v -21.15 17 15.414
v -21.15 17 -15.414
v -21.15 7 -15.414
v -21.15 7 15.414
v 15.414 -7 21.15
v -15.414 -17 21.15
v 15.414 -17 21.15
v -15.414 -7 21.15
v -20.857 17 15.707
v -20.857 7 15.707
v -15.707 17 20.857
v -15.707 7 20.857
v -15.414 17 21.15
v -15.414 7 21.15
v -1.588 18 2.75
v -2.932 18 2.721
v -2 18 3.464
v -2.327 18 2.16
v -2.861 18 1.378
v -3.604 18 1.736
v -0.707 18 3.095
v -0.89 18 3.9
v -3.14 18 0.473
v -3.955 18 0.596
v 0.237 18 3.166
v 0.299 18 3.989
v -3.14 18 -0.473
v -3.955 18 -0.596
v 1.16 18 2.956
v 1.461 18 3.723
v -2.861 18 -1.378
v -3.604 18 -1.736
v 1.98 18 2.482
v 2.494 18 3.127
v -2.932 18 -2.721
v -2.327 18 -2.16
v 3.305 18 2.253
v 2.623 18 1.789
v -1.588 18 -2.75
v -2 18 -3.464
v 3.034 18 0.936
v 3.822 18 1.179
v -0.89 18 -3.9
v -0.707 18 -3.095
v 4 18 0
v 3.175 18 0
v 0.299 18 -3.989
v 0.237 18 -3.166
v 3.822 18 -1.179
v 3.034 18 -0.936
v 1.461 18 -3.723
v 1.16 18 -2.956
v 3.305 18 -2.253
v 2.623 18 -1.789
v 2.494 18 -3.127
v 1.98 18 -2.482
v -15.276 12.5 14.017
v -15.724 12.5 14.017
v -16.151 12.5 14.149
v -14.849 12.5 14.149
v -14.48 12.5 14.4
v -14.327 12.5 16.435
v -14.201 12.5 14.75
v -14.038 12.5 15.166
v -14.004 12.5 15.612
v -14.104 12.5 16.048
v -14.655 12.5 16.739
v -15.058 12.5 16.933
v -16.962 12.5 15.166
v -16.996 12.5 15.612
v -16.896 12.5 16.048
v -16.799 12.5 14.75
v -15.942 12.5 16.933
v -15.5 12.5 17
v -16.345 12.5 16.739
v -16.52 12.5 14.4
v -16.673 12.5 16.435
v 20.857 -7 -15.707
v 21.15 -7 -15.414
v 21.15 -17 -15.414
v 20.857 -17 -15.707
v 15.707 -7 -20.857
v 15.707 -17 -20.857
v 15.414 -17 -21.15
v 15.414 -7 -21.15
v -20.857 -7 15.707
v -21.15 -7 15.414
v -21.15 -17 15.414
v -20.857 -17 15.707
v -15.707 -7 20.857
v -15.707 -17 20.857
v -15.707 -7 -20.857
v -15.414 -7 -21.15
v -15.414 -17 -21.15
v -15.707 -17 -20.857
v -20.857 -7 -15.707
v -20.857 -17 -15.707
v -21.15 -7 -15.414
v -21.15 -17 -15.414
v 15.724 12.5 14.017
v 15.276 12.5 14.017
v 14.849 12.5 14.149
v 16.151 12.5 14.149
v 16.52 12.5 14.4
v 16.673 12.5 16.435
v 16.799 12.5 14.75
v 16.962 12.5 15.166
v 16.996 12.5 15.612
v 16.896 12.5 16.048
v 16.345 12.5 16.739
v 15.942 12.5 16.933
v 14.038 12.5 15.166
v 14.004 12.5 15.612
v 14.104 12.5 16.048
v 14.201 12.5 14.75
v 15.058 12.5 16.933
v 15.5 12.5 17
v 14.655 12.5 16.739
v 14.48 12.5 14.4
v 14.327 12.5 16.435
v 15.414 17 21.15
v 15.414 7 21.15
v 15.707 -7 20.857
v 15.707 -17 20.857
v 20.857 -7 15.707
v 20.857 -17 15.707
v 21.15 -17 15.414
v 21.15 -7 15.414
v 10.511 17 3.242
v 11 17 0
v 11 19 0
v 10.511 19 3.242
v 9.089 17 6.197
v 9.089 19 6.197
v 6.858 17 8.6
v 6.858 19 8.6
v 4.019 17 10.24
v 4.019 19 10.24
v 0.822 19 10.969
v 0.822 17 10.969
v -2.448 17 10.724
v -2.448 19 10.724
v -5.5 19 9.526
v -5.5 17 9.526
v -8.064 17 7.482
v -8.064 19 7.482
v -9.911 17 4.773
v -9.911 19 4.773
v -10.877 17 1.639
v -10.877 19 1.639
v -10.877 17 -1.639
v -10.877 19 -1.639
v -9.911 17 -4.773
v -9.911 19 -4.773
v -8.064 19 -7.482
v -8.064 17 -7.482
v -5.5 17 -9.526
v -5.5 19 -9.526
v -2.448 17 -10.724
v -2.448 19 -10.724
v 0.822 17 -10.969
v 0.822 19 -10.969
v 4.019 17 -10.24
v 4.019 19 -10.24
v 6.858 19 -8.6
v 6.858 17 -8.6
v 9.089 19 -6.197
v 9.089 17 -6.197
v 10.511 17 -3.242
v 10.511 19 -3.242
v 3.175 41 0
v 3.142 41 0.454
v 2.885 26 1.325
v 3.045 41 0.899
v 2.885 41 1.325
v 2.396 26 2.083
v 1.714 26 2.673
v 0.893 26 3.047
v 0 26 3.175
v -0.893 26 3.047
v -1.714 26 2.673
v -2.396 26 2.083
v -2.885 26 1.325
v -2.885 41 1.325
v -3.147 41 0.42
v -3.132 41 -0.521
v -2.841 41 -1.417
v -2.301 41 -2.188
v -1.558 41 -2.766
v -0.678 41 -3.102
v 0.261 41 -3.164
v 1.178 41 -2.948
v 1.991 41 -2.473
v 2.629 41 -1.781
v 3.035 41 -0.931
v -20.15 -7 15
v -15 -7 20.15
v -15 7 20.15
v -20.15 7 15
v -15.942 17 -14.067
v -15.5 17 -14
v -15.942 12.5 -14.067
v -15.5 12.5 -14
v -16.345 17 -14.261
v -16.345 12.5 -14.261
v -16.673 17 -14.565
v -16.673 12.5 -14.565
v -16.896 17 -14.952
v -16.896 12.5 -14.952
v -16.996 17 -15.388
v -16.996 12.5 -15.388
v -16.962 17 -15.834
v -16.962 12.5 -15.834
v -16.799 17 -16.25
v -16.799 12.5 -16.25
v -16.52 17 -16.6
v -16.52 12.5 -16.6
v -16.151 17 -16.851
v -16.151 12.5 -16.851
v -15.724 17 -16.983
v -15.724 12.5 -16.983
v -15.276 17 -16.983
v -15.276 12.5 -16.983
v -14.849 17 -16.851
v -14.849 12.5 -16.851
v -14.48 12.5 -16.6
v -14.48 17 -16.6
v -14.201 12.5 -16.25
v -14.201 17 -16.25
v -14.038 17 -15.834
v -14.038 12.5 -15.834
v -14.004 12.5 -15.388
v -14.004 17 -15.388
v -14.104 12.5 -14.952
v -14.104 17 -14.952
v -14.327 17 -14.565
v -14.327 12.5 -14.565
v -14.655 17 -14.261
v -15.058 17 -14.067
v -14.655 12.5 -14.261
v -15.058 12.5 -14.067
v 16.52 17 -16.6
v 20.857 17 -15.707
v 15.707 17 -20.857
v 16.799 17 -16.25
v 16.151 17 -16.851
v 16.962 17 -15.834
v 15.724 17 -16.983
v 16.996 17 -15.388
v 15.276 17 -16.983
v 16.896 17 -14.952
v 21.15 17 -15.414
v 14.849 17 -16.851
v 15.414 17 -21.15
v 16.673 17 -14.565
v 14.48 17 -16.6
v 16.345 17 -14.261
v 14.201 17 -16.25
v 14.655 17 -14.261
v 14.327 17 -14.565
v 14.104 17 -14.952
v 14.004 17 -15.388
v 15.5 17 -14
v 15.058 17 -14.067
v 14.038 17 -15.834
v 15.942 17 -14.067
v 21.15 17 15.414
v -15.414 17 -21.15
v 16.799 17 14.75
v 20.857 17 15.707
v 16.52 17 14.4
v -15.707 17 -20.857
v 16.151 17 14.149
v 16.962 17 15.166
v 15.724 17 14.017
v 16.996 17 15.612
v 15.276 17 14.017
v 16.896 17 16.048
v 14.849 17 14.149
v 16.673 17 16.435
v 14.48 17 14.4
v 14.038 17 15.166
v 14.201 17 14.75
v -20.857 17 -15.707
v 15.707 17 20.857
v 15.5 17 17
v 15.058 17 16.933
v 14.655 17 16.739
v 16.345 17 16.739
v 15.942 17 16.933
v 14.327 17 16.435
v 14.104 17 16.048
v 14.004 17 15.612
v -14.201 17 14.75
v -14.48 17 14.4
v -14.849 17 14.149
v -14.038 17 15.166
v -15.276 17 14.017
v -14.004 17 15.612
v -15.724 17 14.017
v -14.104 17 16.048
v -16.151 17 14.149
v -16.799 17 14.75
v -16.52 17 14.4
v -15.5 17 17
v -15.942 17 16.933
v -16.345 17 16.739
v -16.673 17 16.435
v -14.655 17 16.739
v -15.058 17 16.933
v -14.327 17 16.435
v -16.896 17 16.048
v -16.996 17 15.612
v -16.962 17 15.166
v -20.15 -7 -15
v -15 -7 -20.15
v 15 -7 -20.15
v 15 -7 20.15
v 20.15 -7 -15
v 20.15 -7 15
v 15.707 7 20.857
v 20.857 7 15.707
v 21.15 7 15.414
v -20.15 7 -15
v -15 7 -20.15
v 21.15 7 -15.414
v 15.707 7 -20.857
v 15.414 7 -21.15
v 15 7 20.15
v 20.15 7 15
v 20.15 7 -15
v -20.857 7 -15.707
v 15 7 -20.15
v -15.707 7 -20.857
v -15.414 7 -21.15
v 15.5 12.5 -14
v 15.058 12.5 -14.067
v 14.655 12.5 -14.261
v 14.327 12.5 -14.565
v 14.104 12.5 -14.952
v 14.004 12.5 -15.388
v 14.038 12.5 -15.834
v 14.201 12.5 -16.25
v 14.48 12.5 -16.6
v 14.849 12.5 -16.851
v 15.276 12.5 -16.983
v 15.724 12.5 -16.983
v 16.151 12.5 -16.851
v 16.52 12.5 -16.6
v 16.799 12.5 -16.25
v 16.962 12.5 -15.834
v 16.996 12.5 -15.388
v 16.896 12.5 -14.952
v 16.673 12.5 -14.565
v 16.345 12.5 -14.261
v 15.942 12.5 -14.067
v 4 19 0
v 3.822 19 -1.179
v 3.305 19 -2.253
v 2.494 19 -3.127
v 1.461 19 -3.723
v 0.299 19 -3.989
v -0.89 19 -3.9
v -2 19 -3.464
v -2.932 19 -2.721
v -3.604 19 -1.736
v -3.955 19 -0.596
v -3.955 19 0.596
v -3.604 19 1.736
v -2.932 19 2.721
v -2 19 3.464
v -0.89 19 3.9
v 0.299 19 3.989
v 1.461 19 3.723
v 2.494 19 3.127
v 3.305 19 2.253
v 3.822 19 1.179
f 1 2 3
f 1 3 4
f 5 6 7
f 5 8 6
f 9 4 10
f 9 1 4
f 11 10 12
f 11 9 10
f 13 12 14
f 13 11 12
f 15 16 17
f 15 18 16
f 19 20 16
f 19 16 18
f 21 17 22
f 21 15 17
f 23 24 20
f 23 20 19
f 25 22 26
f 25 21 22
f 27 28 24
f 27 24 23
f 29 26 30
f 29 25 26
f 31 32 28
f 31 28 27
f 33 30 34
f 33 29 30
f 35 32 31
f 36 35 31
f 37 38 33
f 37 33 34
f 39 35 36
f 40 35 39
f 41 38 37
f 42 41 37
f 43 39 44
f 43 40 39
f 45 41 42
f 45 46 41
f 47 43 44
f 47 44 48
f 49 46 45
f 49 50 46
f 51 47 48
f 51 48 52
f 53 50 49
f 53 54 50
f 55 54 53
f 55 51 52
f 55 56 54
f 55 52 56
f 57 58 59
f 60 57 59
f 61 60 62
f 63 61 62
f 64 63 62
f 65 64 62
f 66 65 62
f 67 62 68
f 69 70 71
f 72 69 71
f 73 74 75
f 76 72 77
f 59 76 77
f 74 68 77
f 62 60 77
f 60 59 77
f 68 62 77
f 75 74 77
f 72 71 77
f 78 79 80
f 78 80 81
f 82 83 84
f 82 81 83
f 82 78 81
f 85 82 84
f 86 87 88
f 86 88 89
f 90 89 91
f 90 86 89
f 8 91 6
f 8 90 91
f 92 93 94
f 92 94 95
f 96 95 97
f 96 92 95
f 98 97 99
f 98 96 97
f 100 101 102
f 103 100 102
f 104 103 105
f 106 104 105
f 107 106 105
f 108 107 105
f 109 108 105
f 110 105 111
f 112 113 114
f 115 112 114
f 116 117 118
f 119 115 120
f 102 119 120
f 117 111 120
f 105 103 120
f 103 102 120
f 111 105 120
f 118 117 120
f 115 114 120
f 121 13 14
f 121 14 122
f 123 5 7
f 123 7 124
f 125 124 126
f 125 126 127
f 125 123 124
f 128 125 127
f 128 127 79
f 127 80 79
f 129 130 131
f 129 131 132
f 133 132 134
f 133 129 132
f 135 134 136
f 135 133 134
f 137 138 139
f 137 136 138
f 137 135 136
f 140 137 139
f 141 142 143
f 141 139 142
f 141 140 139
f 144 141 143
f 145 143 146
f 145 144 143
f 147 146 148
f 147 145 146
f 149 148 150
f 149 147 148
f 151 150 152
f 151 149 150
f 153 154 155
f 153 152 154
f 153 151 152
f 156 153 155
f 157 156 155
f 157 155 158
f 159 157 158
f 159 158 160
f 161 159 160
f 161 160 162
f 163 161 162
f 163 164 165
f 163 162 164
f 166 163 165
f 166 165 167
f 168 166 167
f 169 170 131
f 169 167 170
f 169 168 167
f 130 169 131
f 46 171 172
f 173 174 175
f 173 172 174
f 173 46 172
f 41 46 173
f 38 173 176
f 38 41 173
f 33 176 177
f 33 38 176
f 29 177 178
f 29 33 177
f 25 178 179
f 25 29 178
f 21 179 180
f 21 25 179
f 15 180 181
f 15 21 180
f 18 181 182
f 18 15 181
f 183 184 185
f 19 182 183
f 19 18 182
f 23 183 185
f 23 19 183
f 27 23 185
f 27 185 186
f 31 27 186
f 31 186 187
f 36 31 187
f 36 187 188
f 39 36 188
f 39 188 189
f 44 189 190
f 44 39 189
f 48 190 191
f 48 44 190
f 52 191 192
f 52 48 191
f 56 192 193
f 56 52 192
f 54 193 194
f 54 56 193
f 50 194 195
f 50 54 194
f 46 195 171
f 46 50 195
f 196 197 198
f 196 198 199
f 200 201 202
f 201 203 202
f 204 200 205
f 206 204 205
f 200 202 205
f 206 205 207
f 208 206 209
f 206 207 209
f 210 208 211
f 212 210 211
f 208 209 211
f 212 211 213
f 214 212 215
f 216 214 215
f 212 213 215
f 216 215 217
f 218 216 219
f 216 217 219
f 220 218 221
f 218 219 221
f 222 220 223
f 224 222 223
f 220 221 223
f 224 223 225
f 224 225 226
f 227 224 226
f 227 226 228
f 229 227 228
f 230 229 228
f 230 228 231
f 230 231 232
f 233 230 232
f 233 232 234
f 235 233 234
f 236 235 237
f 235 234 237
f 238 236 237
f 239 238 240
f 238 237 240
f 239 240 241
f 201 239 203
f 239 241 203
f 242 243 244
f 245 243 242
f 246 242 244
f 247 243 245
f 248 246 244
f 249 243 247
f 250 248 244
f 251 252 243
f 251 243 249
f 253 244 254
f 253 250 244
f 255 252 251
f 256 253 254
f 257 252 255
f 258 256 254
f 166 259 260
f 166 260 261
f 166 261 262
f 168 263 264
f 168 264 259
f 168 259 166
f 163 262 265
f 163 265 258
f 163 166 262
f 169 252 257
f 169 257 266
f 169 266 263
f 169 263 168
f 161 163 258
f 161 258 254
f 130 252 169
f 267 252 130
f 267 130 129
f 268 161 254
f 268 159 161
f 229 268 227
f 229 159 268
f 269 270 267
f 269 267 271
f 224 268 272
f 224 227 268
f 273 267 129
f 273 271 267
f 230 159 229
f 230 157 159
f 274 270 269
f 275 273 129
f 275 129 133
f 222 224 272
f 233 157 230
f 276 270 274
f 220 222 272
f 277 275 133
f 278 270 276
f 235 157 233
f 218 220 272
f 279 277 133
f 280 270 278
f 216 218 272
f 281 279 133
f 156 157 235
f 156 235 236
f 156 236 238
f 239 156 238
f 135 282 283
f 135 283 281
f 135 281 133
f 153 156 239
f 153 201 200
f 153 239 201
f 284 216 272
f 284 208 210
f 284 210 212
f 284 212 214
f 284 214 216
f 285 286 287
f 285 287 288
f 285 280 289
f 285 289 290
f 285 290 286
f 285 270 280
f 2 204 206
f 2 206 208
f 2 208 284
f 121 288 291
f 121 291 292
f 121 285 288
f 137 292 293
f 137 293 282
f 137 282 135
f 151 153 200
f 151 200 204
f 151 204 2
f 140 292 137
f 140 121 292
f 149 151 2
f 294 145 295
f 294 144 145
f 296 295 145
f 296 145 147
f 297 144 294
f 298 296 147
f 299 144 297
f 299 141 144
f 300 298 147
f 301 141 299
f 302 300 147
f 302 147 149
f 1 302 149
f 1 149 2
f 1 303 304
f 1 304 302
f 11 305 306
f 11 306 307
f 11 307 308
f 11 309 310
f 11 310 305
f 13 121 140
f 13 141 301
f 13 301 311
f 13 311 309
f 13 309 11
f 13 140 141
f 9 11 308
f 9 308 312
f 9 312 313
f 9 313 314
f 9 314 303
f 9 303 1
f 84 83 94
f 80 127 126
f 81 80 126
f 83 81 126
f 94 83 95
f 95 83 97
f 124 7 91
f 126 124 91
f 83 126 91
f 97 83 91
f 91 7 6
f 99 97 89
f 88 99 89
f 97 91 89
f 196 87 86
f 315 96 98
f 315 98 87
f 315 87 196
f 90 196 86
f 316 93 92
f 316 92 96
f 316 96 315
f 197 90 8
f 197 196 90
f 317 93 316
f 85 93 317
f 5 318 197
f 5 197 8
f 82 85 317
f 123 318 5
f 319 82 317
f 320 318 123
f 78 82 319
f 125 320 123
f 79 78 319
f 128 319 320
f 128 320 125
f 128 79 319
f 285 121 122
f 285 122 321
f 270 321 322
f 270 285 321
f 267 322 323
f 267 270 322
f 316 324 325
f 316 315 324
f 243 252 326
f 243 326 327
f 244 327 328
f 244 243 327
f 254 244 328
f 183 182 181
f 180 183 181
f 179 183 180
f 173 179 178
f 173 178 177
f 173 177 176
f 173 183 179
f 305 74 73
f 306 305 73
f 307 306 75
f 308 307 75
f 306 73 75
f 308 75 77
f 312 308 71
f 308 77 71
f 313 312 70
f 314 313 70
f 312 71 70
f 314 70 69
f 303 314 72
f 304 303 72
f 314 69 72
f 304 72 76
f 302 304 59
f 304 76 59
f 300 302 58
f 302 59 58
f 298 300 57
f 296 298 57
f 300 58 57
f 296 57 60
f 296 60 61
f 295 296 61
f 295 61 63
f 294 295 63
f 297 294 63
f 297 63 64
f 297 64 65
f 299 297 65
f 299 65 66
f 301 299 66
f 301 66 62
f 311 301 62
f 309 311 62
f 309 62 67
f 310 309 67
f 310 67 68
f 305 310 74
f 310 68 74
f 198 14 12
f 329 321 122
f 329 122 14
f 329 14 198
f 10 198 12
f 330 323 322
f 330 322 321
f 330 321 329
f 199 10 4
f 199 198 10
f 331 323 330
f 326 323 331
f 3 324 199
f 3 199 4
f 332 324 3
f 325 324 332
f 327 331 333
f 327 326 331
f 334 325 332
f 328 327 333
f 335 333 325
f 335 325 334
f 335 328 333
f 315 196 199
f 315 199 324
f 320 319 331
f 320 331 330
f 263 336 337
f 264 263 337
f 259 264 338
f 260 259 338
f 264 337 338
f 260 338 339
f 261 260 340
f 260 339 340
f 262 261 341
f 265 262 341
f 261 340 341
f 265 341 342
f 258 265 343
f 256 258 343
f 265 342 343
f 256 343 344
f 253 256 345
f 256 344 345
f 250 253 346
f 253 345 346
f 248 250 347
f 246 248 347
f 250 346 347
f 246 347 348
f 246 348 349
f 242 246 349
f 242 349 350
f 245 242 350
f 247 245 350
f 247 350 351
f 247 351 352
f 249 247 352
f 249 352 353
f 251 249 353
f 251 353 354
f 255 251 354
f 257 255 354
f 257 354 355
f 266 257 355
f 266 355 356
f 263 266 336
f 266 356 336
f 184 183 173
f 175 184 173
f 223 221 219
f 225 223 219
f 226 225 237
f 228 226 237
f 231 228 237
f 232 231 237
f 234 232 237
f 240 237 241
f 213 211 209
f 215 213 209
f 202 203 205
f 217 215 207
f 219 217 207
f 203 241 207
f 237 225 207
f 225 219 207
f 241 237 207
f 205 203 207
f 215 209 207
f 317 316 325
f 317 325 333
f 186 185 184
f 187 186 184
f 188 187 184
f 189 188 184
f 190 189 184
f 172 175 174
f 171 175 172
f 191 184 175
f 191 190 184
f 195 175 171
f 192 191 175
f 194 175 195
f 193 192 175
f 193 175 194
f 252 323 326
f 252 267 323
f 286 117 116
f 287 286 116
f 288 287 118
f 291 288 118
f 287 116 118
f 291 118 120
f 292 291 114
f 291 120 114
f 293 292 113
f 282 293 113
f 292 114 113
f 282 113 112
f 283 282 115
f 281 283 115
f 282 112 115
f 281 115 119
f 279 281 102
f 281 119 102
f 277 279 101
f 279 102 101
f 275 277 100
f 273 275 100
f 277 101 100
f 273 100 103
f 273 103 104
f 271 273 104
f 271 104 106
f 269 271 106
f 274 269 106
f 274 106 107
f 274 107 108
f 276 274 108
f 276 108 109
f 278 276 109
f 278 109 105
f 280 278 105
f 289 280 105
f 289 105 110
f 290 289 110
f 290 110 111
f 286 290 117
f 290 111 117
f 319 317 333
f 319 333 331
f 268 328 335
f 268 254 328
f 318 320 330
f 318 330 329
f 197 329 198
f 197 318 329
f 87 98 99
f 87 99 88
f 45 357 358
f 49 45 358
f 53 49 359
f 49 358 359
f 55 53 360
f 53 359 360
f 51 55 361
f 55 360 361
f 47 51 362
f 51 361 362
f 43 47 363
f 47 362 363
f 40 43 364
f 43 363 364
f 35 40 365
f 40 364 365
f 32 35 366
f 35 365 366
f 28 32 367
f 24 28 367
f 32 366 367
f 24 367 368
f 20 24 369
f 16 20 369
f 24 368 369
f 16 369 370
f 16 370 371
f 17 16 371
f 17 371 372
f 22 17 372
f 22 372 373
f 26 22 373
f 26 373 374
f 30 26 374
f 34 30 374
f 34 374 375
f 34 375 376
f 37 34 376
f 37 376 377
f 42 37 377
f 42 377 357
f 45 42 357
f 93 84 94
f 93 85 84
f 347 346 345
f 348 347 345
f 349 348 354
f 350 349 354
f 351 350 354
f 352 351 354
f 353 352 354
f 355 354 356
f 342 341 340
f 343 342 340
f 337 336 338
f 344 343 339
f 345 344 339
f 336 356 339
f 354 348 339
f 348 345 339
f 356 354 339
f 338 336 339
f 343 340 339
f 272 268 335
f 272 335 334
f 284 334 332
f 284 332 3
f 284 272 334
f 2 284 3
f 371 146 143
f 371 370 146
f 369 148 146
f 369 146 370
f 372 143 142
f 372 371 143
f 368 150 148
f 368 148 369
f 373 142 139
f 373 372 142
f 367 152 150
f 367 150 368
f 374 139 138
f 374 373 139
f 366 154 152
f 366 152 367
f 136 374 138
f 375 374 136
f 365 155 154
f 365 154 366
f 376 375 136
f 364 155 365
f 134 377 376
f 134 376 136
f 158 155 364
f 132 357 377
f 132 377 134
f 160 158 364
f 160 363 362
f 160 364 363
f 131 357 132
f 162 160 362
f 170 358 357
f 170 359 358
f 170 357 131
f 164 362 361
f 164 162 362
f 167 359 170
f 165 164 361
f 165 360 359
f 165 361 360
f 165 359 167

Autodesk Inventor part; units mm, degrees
ref_plane "YZ Plane" through (0, 0, 0) normal (1, 0, 0) x (0, 1, 0)
ref_plane "XZ Plane" through (0, 0, 0) normal (0, 1, 0) x (-1, 0, 0)
ref_plane "XY Plane" through (0, 0, 0) normal (0, 0, 1) x (1, 0, 0)
sketch "Sketch2" plane through (0, 0, 0) normal (0, 1, 0) x (-1, 0, 0)
  line L0 (15, 20.15) -> (20.15, 15)
  line L1 (20.15, 15) -> (20.15, -15)
  line L2 (20.15, -15) -> (15, -20.15)
  line L3 (15, -20.15) -> (-15, -20.15)
  line L4 (-15, -20.15) -> (-20.15, -15)
  line L5 (-20.15, -15) -> (-20.15, 15)
  line L6 (-20.15, 15) -> (-15, 20.15)
  line L7 (-15, 20.15) -> (15, 20.15)
  point P0 (0, 0)
  point P1 (20.15, 0)
  point P2 (0, -20.15)
  dimension "d2" = 30
  dimension "d3" = 40.3
  dimension "d4" = 135
extrude "Extrusion1" add sketch "Sketch2" along normal mid plane 34
sketch "Sketch7" plane through (0, 17, 0) normal (0, 1, 0) x (1, 0, 0)
  circle A0 centre (0, 0) radius 11
  dimension "d27" = 22
extrude "Extrusion3" add sketch "Sketch7" along normal blind 2
sketch "Sketch8" plane through (0, 19, 0) normal (0, 1, 0) x (1, 0, 0)
  circle A0 centre (0, 0) radius 4
  dimension "d30" = 8
extrude "Extrusion4" cut sketch "Sketch8" against normal blind 1
sketch "Sketch9" plane through (0, 18, 0) normal (0, 1, 0) x (1, 0, 0)
  circle A0 centre (0, 0) radius 3.175
  dimension "d33" = 6.35
extrude "Extrusion5" add sketch "Sketch9" along normal blind 23
sketch "Sketch10" plane through (-15, 17, 20.15) normal (0, 0, 1) x (1, 0, 0)
  line L0 (30, 0) -> (30, -34) projected
  line L1 (0, 0) -> (30, 0) projected
  line L2 (0, -34) -> (0, 0) projected
  line L3 (30, -34) -> (0, -34) projected
  line L4 (0, 0) -> (30, 0)
  line L5 (30, 0) -> (30, -10)
  line L6 (30, -10) -> (0, -10)
  line L7 (0, -10) -> (0, 0)
  line L8 (0, 0) -> (30, -10) construction
  line L9 (30, 0) -> (0, -10) construction
  line L10 (0, -24) -> (30, -24)
  line L11 (30, -24) -> (30, -34)
  line L12 (30, -34) -> (0, -34)
  line L13 (0, -34) -> (0, -24)
  line L14 (0, -24) -> (30, -34) construction
  line L15 (30, -24) -> (0, -34) construction
  line L16 (0, 0) -> (30, 0) projected
  point P0 (15, -17)
  point P1 (15, -5)
  point P2 (15, -29)
  dimension "d36" = 10
  dimension "d37" = 10
extrude "Extrusion6" add sketch "Sketch10" along normal blind 1 contours L0 L6 L2 L1 | L0 L3 L2 L10
mirror "Mirror1" about plane through (0, 0, 0) normal (0, 0, 1) of "Extrusion6"
sketch "Sketch11" plane through (20.15, -17, -15) normal (1, 0, 0) x (0, 0, -1)
  line L0 (0, 34) -> (0, 0) projected
  line L1 (-30, 34) -> (0, 34) projected
  line L2 (-30, 34) -> (-30, 0) projected
  line L3 (0, 0) -> (-30, 0) projected
  line L4 (-30, 34) -> (0, 34)
  line L5 (0, 34) -> (0, 24)
  line L6 (0, 24) -> (-30, 24)
  line L7 (-30, 24) -> (-30, 34)
  line L8 (-30, 34) -> (0, 24) construction
  line L9 (0, 34) -> (-30, 24) construction
  line L10 (-30, 10) -> (0, 10)
  line L11 (0, 10) -> (0, 0)
  line L12 (0, 0) -> (-30, 0)
  line L13 (-30, 0) -> (-30, 10)
  line L14 (-30, 10) -> (0, 0) construction
  line L15 (0, 10) -> (-30, 0) construction
  line L16 (-30, 34) -> (0, 34) projected
  point P0 (-15, 17)
  point P1 (-15, 29)
  point P2 (-15, 5)
  dimension "d40" = 10
extrude "Extrusion7" add sketch "Sketch11" along normal blind 1 contours L0 L6 L2 L1 | L0 L3 L2 L10
mirror "Mirror2" about plane through (0, 0, 0) normal (1, 0, 0) of "Extrusion7"
sketch "Sketch12" plane through (-15, -7, 20.15) normal (-0.7071, 0, 0.7071) x (0.7071, 0, 0.7071)
  line L0 (0, -10) -> (0, 0) projected
  line L1 (0, 0) -> (0, 14) projected
  line L2 (0, 14) -> (0, 24) projected
  line L3 (-7.2832, 24) -> (0, 24) projected
  line L4 (-7.2832, 24) -> (-7.2832, 14) projected
  line L5 (-7.2832, 14) -> (-7.2832, 0) projected
  line L6 (-7.2832, 0) -> (-7.2832, -10) projected
  line L7 (0, -10) -> (-7.2832, -10) projected
  line L8 (-7.2832, 24) -> (0, 24)
  line L9 (0, 24) -> (0, 14)
  line L10 (0, 14) -> (-7.2832, 14)
  line L11 (-7.2832, 14) -> (-7.2832, 24)
  line L12 (-7.2832, 24) -> (0, 14) construction
  line L13 (0, 24) -> (-7.2832, 14) construction
  line L14 (-7.2832, 0) -> (0, 0)
  line L15 (0, 0) -> (0, -10)
  line L16 (0, -10) -> (-7.2832, -10)
  line L17 (-7.2832, -10) -> (-7.2832, 0)
  line L18 (-7.2832, 0) -> (0, -10) construction
  line L19 (0, 0) -> (-7.2832, -10) construction
  line L20 (-7.2832, 24) -> (0, 24) projected
  line L21 (0, -10) -> (-7.2832, -10) projected
  point P0 (-3.6416, 7)
  point P1 (-3.6416, 19)
  point P2 (-3.6416, -5)
  dimension "d43" = 10
  dimension "d44" = 10
extrude "Extrusion8" add sketch "Sketch12" along normal blind 1 contours L7 L6 L14 L0 | L10 L4 L3 L2
sketch "Sketch14" plane through (-15, 7, 21.15) normal (-1, 0, 0) x (0, 0, 1)
  line L0 (-1, 0) -> (-1, 10) projected
  line L1 (-1, 0) -> (0, 0) projected
  line L2 (0, 10) -> (0, 0) projected
  line L3 (-1, 10) -> (0, 10) projected
  line L4 (-1, -24) -> (-1, -14) projected
  line L5 (-1, -24) -> (0, -24) projected
  line L6 (0, -14) -> (0, -24) projected
  line L7 (-1, -14) -> (0, -14) projected
  point P0 (-21.15, -7)
extrude "Extrusion9" add sketch "Sketch14" along normal up to surface surface through (-18.2821, 12, 18.2821) normal (-0.7071, 0, 0.7071)
sketch "Sketch15" plane through (-21.15, 7, 15) normal (0, 0, 1) x (1, 0, 0)
  line L0 (1, 10) -> (1, 0) projected
  line L1 (1, 10) -> (0, 10) projected
  line L2 (0, 10) -> (0, 0) projected
  line L3 (1, 0) -> (0, 0) projected
  line L4 (1, -14) -> (1, -24) projected
  line L5 (1, -14) -> (0, -14) projected
  line L6 (0, -14) -> (0, -24) projected
  line L7 (1, -24) -> (0, -24) projected
  point P0 (21.15, -7)
extrude "Extrusion10" add sketch "Sketch15" along normal up to surface surface through (-18.2821, -12, 18.2821) normal (-0.7071, 0, 0.7071)
mirror "Mirror3" about plane through (0, 0, 0) normal (1, 0, 0) of "Extrusion8", "Extrusion9", "Extrusion10"
mirror "Mirror4" about plane through (0, 0, 0) normal (0, 0, 1) of "Extrusion8", "Extrusion9", "Extrusion10", "Mirror3"
sketch "Sketch17" plane through (0, 17, 0) normal (0, 1, 0) x (1, 0, 0)
  line L0 (-21.15, -15.4142) -> (-15.4142, -21.15) projected
  line L1 (-15.4142, -21.15) -> (15.4142, -21.15) projected
  line L2 (21.15, -15.4142) -> (15.4142, -21.15) projected
  line L3 (21.15, -15.4142) -> (21.15, 15.4142) projected
  line L4 (21.15, 15.4142) -> (15.4142, 21.15) projected
  line L5 (15.4142, 21.15) -> (-15.4142, 21.15) projected
  line L6 (-21.15, 15.4142) -> (-15.4142, 21.15) projected
  line L7 (-21.15, 15.4142) -> (-21.15, -15.4142) projected
  circle A0 centre (0, 0) radius 11 projected
  circle A1 centre (-15.5, -15.5) radius 1.5
  circle A2 centre (-15.5, 15.5) radius 1.5
  circle A3 centre (15.5, 15.5) radius 1.5
  circle A4 centre (15.5, -15.5) radius 1.5
  dimension "d53" = 3
  dimension "d54" = 31
  dimension "d55" = 31
  dimension "d57" = 15.5
  dimension "d66" = 15.5
hole "Hole3" at (-15.5, 17, 15.5) at (-15.5, 17, -15.5) at (15.5, 17, -15.5) at (15.5, 17, 15.5) direction (0, -1, 0) diameter 3 depth 4.5
sketch "Sketch19" plane through (0, 41, 0) normal (0, 1, 0) x (1, 0, 0)
  circle A0 centre (0, 0) radius 3.175 projected
  circle A1 centre (0, 0) radius 3.175 projected
  line L0 (-2.8853, -1.325) -> (2.8853, -1.325)
  dimension "d69" = 4.5
extrude "Extrusion12" cut sketch "Sketch19" against normal blind 15 contours L0 A0 picked at (0, -1.9417)
ref_plane "Work Plane1" through (0, 0, 0) normal (1, 0, 0) x (0, 1, 0)
ref_plane "Work Plane2" through (0, 0, 0) normal (-1, 0, 0) x (0, 1, 0)
ref_plane "Work Plane3" through (0, 0, 0) normal (-1, 0, 0) x (0, 1, 0)
properties part number "Motor_paso"
